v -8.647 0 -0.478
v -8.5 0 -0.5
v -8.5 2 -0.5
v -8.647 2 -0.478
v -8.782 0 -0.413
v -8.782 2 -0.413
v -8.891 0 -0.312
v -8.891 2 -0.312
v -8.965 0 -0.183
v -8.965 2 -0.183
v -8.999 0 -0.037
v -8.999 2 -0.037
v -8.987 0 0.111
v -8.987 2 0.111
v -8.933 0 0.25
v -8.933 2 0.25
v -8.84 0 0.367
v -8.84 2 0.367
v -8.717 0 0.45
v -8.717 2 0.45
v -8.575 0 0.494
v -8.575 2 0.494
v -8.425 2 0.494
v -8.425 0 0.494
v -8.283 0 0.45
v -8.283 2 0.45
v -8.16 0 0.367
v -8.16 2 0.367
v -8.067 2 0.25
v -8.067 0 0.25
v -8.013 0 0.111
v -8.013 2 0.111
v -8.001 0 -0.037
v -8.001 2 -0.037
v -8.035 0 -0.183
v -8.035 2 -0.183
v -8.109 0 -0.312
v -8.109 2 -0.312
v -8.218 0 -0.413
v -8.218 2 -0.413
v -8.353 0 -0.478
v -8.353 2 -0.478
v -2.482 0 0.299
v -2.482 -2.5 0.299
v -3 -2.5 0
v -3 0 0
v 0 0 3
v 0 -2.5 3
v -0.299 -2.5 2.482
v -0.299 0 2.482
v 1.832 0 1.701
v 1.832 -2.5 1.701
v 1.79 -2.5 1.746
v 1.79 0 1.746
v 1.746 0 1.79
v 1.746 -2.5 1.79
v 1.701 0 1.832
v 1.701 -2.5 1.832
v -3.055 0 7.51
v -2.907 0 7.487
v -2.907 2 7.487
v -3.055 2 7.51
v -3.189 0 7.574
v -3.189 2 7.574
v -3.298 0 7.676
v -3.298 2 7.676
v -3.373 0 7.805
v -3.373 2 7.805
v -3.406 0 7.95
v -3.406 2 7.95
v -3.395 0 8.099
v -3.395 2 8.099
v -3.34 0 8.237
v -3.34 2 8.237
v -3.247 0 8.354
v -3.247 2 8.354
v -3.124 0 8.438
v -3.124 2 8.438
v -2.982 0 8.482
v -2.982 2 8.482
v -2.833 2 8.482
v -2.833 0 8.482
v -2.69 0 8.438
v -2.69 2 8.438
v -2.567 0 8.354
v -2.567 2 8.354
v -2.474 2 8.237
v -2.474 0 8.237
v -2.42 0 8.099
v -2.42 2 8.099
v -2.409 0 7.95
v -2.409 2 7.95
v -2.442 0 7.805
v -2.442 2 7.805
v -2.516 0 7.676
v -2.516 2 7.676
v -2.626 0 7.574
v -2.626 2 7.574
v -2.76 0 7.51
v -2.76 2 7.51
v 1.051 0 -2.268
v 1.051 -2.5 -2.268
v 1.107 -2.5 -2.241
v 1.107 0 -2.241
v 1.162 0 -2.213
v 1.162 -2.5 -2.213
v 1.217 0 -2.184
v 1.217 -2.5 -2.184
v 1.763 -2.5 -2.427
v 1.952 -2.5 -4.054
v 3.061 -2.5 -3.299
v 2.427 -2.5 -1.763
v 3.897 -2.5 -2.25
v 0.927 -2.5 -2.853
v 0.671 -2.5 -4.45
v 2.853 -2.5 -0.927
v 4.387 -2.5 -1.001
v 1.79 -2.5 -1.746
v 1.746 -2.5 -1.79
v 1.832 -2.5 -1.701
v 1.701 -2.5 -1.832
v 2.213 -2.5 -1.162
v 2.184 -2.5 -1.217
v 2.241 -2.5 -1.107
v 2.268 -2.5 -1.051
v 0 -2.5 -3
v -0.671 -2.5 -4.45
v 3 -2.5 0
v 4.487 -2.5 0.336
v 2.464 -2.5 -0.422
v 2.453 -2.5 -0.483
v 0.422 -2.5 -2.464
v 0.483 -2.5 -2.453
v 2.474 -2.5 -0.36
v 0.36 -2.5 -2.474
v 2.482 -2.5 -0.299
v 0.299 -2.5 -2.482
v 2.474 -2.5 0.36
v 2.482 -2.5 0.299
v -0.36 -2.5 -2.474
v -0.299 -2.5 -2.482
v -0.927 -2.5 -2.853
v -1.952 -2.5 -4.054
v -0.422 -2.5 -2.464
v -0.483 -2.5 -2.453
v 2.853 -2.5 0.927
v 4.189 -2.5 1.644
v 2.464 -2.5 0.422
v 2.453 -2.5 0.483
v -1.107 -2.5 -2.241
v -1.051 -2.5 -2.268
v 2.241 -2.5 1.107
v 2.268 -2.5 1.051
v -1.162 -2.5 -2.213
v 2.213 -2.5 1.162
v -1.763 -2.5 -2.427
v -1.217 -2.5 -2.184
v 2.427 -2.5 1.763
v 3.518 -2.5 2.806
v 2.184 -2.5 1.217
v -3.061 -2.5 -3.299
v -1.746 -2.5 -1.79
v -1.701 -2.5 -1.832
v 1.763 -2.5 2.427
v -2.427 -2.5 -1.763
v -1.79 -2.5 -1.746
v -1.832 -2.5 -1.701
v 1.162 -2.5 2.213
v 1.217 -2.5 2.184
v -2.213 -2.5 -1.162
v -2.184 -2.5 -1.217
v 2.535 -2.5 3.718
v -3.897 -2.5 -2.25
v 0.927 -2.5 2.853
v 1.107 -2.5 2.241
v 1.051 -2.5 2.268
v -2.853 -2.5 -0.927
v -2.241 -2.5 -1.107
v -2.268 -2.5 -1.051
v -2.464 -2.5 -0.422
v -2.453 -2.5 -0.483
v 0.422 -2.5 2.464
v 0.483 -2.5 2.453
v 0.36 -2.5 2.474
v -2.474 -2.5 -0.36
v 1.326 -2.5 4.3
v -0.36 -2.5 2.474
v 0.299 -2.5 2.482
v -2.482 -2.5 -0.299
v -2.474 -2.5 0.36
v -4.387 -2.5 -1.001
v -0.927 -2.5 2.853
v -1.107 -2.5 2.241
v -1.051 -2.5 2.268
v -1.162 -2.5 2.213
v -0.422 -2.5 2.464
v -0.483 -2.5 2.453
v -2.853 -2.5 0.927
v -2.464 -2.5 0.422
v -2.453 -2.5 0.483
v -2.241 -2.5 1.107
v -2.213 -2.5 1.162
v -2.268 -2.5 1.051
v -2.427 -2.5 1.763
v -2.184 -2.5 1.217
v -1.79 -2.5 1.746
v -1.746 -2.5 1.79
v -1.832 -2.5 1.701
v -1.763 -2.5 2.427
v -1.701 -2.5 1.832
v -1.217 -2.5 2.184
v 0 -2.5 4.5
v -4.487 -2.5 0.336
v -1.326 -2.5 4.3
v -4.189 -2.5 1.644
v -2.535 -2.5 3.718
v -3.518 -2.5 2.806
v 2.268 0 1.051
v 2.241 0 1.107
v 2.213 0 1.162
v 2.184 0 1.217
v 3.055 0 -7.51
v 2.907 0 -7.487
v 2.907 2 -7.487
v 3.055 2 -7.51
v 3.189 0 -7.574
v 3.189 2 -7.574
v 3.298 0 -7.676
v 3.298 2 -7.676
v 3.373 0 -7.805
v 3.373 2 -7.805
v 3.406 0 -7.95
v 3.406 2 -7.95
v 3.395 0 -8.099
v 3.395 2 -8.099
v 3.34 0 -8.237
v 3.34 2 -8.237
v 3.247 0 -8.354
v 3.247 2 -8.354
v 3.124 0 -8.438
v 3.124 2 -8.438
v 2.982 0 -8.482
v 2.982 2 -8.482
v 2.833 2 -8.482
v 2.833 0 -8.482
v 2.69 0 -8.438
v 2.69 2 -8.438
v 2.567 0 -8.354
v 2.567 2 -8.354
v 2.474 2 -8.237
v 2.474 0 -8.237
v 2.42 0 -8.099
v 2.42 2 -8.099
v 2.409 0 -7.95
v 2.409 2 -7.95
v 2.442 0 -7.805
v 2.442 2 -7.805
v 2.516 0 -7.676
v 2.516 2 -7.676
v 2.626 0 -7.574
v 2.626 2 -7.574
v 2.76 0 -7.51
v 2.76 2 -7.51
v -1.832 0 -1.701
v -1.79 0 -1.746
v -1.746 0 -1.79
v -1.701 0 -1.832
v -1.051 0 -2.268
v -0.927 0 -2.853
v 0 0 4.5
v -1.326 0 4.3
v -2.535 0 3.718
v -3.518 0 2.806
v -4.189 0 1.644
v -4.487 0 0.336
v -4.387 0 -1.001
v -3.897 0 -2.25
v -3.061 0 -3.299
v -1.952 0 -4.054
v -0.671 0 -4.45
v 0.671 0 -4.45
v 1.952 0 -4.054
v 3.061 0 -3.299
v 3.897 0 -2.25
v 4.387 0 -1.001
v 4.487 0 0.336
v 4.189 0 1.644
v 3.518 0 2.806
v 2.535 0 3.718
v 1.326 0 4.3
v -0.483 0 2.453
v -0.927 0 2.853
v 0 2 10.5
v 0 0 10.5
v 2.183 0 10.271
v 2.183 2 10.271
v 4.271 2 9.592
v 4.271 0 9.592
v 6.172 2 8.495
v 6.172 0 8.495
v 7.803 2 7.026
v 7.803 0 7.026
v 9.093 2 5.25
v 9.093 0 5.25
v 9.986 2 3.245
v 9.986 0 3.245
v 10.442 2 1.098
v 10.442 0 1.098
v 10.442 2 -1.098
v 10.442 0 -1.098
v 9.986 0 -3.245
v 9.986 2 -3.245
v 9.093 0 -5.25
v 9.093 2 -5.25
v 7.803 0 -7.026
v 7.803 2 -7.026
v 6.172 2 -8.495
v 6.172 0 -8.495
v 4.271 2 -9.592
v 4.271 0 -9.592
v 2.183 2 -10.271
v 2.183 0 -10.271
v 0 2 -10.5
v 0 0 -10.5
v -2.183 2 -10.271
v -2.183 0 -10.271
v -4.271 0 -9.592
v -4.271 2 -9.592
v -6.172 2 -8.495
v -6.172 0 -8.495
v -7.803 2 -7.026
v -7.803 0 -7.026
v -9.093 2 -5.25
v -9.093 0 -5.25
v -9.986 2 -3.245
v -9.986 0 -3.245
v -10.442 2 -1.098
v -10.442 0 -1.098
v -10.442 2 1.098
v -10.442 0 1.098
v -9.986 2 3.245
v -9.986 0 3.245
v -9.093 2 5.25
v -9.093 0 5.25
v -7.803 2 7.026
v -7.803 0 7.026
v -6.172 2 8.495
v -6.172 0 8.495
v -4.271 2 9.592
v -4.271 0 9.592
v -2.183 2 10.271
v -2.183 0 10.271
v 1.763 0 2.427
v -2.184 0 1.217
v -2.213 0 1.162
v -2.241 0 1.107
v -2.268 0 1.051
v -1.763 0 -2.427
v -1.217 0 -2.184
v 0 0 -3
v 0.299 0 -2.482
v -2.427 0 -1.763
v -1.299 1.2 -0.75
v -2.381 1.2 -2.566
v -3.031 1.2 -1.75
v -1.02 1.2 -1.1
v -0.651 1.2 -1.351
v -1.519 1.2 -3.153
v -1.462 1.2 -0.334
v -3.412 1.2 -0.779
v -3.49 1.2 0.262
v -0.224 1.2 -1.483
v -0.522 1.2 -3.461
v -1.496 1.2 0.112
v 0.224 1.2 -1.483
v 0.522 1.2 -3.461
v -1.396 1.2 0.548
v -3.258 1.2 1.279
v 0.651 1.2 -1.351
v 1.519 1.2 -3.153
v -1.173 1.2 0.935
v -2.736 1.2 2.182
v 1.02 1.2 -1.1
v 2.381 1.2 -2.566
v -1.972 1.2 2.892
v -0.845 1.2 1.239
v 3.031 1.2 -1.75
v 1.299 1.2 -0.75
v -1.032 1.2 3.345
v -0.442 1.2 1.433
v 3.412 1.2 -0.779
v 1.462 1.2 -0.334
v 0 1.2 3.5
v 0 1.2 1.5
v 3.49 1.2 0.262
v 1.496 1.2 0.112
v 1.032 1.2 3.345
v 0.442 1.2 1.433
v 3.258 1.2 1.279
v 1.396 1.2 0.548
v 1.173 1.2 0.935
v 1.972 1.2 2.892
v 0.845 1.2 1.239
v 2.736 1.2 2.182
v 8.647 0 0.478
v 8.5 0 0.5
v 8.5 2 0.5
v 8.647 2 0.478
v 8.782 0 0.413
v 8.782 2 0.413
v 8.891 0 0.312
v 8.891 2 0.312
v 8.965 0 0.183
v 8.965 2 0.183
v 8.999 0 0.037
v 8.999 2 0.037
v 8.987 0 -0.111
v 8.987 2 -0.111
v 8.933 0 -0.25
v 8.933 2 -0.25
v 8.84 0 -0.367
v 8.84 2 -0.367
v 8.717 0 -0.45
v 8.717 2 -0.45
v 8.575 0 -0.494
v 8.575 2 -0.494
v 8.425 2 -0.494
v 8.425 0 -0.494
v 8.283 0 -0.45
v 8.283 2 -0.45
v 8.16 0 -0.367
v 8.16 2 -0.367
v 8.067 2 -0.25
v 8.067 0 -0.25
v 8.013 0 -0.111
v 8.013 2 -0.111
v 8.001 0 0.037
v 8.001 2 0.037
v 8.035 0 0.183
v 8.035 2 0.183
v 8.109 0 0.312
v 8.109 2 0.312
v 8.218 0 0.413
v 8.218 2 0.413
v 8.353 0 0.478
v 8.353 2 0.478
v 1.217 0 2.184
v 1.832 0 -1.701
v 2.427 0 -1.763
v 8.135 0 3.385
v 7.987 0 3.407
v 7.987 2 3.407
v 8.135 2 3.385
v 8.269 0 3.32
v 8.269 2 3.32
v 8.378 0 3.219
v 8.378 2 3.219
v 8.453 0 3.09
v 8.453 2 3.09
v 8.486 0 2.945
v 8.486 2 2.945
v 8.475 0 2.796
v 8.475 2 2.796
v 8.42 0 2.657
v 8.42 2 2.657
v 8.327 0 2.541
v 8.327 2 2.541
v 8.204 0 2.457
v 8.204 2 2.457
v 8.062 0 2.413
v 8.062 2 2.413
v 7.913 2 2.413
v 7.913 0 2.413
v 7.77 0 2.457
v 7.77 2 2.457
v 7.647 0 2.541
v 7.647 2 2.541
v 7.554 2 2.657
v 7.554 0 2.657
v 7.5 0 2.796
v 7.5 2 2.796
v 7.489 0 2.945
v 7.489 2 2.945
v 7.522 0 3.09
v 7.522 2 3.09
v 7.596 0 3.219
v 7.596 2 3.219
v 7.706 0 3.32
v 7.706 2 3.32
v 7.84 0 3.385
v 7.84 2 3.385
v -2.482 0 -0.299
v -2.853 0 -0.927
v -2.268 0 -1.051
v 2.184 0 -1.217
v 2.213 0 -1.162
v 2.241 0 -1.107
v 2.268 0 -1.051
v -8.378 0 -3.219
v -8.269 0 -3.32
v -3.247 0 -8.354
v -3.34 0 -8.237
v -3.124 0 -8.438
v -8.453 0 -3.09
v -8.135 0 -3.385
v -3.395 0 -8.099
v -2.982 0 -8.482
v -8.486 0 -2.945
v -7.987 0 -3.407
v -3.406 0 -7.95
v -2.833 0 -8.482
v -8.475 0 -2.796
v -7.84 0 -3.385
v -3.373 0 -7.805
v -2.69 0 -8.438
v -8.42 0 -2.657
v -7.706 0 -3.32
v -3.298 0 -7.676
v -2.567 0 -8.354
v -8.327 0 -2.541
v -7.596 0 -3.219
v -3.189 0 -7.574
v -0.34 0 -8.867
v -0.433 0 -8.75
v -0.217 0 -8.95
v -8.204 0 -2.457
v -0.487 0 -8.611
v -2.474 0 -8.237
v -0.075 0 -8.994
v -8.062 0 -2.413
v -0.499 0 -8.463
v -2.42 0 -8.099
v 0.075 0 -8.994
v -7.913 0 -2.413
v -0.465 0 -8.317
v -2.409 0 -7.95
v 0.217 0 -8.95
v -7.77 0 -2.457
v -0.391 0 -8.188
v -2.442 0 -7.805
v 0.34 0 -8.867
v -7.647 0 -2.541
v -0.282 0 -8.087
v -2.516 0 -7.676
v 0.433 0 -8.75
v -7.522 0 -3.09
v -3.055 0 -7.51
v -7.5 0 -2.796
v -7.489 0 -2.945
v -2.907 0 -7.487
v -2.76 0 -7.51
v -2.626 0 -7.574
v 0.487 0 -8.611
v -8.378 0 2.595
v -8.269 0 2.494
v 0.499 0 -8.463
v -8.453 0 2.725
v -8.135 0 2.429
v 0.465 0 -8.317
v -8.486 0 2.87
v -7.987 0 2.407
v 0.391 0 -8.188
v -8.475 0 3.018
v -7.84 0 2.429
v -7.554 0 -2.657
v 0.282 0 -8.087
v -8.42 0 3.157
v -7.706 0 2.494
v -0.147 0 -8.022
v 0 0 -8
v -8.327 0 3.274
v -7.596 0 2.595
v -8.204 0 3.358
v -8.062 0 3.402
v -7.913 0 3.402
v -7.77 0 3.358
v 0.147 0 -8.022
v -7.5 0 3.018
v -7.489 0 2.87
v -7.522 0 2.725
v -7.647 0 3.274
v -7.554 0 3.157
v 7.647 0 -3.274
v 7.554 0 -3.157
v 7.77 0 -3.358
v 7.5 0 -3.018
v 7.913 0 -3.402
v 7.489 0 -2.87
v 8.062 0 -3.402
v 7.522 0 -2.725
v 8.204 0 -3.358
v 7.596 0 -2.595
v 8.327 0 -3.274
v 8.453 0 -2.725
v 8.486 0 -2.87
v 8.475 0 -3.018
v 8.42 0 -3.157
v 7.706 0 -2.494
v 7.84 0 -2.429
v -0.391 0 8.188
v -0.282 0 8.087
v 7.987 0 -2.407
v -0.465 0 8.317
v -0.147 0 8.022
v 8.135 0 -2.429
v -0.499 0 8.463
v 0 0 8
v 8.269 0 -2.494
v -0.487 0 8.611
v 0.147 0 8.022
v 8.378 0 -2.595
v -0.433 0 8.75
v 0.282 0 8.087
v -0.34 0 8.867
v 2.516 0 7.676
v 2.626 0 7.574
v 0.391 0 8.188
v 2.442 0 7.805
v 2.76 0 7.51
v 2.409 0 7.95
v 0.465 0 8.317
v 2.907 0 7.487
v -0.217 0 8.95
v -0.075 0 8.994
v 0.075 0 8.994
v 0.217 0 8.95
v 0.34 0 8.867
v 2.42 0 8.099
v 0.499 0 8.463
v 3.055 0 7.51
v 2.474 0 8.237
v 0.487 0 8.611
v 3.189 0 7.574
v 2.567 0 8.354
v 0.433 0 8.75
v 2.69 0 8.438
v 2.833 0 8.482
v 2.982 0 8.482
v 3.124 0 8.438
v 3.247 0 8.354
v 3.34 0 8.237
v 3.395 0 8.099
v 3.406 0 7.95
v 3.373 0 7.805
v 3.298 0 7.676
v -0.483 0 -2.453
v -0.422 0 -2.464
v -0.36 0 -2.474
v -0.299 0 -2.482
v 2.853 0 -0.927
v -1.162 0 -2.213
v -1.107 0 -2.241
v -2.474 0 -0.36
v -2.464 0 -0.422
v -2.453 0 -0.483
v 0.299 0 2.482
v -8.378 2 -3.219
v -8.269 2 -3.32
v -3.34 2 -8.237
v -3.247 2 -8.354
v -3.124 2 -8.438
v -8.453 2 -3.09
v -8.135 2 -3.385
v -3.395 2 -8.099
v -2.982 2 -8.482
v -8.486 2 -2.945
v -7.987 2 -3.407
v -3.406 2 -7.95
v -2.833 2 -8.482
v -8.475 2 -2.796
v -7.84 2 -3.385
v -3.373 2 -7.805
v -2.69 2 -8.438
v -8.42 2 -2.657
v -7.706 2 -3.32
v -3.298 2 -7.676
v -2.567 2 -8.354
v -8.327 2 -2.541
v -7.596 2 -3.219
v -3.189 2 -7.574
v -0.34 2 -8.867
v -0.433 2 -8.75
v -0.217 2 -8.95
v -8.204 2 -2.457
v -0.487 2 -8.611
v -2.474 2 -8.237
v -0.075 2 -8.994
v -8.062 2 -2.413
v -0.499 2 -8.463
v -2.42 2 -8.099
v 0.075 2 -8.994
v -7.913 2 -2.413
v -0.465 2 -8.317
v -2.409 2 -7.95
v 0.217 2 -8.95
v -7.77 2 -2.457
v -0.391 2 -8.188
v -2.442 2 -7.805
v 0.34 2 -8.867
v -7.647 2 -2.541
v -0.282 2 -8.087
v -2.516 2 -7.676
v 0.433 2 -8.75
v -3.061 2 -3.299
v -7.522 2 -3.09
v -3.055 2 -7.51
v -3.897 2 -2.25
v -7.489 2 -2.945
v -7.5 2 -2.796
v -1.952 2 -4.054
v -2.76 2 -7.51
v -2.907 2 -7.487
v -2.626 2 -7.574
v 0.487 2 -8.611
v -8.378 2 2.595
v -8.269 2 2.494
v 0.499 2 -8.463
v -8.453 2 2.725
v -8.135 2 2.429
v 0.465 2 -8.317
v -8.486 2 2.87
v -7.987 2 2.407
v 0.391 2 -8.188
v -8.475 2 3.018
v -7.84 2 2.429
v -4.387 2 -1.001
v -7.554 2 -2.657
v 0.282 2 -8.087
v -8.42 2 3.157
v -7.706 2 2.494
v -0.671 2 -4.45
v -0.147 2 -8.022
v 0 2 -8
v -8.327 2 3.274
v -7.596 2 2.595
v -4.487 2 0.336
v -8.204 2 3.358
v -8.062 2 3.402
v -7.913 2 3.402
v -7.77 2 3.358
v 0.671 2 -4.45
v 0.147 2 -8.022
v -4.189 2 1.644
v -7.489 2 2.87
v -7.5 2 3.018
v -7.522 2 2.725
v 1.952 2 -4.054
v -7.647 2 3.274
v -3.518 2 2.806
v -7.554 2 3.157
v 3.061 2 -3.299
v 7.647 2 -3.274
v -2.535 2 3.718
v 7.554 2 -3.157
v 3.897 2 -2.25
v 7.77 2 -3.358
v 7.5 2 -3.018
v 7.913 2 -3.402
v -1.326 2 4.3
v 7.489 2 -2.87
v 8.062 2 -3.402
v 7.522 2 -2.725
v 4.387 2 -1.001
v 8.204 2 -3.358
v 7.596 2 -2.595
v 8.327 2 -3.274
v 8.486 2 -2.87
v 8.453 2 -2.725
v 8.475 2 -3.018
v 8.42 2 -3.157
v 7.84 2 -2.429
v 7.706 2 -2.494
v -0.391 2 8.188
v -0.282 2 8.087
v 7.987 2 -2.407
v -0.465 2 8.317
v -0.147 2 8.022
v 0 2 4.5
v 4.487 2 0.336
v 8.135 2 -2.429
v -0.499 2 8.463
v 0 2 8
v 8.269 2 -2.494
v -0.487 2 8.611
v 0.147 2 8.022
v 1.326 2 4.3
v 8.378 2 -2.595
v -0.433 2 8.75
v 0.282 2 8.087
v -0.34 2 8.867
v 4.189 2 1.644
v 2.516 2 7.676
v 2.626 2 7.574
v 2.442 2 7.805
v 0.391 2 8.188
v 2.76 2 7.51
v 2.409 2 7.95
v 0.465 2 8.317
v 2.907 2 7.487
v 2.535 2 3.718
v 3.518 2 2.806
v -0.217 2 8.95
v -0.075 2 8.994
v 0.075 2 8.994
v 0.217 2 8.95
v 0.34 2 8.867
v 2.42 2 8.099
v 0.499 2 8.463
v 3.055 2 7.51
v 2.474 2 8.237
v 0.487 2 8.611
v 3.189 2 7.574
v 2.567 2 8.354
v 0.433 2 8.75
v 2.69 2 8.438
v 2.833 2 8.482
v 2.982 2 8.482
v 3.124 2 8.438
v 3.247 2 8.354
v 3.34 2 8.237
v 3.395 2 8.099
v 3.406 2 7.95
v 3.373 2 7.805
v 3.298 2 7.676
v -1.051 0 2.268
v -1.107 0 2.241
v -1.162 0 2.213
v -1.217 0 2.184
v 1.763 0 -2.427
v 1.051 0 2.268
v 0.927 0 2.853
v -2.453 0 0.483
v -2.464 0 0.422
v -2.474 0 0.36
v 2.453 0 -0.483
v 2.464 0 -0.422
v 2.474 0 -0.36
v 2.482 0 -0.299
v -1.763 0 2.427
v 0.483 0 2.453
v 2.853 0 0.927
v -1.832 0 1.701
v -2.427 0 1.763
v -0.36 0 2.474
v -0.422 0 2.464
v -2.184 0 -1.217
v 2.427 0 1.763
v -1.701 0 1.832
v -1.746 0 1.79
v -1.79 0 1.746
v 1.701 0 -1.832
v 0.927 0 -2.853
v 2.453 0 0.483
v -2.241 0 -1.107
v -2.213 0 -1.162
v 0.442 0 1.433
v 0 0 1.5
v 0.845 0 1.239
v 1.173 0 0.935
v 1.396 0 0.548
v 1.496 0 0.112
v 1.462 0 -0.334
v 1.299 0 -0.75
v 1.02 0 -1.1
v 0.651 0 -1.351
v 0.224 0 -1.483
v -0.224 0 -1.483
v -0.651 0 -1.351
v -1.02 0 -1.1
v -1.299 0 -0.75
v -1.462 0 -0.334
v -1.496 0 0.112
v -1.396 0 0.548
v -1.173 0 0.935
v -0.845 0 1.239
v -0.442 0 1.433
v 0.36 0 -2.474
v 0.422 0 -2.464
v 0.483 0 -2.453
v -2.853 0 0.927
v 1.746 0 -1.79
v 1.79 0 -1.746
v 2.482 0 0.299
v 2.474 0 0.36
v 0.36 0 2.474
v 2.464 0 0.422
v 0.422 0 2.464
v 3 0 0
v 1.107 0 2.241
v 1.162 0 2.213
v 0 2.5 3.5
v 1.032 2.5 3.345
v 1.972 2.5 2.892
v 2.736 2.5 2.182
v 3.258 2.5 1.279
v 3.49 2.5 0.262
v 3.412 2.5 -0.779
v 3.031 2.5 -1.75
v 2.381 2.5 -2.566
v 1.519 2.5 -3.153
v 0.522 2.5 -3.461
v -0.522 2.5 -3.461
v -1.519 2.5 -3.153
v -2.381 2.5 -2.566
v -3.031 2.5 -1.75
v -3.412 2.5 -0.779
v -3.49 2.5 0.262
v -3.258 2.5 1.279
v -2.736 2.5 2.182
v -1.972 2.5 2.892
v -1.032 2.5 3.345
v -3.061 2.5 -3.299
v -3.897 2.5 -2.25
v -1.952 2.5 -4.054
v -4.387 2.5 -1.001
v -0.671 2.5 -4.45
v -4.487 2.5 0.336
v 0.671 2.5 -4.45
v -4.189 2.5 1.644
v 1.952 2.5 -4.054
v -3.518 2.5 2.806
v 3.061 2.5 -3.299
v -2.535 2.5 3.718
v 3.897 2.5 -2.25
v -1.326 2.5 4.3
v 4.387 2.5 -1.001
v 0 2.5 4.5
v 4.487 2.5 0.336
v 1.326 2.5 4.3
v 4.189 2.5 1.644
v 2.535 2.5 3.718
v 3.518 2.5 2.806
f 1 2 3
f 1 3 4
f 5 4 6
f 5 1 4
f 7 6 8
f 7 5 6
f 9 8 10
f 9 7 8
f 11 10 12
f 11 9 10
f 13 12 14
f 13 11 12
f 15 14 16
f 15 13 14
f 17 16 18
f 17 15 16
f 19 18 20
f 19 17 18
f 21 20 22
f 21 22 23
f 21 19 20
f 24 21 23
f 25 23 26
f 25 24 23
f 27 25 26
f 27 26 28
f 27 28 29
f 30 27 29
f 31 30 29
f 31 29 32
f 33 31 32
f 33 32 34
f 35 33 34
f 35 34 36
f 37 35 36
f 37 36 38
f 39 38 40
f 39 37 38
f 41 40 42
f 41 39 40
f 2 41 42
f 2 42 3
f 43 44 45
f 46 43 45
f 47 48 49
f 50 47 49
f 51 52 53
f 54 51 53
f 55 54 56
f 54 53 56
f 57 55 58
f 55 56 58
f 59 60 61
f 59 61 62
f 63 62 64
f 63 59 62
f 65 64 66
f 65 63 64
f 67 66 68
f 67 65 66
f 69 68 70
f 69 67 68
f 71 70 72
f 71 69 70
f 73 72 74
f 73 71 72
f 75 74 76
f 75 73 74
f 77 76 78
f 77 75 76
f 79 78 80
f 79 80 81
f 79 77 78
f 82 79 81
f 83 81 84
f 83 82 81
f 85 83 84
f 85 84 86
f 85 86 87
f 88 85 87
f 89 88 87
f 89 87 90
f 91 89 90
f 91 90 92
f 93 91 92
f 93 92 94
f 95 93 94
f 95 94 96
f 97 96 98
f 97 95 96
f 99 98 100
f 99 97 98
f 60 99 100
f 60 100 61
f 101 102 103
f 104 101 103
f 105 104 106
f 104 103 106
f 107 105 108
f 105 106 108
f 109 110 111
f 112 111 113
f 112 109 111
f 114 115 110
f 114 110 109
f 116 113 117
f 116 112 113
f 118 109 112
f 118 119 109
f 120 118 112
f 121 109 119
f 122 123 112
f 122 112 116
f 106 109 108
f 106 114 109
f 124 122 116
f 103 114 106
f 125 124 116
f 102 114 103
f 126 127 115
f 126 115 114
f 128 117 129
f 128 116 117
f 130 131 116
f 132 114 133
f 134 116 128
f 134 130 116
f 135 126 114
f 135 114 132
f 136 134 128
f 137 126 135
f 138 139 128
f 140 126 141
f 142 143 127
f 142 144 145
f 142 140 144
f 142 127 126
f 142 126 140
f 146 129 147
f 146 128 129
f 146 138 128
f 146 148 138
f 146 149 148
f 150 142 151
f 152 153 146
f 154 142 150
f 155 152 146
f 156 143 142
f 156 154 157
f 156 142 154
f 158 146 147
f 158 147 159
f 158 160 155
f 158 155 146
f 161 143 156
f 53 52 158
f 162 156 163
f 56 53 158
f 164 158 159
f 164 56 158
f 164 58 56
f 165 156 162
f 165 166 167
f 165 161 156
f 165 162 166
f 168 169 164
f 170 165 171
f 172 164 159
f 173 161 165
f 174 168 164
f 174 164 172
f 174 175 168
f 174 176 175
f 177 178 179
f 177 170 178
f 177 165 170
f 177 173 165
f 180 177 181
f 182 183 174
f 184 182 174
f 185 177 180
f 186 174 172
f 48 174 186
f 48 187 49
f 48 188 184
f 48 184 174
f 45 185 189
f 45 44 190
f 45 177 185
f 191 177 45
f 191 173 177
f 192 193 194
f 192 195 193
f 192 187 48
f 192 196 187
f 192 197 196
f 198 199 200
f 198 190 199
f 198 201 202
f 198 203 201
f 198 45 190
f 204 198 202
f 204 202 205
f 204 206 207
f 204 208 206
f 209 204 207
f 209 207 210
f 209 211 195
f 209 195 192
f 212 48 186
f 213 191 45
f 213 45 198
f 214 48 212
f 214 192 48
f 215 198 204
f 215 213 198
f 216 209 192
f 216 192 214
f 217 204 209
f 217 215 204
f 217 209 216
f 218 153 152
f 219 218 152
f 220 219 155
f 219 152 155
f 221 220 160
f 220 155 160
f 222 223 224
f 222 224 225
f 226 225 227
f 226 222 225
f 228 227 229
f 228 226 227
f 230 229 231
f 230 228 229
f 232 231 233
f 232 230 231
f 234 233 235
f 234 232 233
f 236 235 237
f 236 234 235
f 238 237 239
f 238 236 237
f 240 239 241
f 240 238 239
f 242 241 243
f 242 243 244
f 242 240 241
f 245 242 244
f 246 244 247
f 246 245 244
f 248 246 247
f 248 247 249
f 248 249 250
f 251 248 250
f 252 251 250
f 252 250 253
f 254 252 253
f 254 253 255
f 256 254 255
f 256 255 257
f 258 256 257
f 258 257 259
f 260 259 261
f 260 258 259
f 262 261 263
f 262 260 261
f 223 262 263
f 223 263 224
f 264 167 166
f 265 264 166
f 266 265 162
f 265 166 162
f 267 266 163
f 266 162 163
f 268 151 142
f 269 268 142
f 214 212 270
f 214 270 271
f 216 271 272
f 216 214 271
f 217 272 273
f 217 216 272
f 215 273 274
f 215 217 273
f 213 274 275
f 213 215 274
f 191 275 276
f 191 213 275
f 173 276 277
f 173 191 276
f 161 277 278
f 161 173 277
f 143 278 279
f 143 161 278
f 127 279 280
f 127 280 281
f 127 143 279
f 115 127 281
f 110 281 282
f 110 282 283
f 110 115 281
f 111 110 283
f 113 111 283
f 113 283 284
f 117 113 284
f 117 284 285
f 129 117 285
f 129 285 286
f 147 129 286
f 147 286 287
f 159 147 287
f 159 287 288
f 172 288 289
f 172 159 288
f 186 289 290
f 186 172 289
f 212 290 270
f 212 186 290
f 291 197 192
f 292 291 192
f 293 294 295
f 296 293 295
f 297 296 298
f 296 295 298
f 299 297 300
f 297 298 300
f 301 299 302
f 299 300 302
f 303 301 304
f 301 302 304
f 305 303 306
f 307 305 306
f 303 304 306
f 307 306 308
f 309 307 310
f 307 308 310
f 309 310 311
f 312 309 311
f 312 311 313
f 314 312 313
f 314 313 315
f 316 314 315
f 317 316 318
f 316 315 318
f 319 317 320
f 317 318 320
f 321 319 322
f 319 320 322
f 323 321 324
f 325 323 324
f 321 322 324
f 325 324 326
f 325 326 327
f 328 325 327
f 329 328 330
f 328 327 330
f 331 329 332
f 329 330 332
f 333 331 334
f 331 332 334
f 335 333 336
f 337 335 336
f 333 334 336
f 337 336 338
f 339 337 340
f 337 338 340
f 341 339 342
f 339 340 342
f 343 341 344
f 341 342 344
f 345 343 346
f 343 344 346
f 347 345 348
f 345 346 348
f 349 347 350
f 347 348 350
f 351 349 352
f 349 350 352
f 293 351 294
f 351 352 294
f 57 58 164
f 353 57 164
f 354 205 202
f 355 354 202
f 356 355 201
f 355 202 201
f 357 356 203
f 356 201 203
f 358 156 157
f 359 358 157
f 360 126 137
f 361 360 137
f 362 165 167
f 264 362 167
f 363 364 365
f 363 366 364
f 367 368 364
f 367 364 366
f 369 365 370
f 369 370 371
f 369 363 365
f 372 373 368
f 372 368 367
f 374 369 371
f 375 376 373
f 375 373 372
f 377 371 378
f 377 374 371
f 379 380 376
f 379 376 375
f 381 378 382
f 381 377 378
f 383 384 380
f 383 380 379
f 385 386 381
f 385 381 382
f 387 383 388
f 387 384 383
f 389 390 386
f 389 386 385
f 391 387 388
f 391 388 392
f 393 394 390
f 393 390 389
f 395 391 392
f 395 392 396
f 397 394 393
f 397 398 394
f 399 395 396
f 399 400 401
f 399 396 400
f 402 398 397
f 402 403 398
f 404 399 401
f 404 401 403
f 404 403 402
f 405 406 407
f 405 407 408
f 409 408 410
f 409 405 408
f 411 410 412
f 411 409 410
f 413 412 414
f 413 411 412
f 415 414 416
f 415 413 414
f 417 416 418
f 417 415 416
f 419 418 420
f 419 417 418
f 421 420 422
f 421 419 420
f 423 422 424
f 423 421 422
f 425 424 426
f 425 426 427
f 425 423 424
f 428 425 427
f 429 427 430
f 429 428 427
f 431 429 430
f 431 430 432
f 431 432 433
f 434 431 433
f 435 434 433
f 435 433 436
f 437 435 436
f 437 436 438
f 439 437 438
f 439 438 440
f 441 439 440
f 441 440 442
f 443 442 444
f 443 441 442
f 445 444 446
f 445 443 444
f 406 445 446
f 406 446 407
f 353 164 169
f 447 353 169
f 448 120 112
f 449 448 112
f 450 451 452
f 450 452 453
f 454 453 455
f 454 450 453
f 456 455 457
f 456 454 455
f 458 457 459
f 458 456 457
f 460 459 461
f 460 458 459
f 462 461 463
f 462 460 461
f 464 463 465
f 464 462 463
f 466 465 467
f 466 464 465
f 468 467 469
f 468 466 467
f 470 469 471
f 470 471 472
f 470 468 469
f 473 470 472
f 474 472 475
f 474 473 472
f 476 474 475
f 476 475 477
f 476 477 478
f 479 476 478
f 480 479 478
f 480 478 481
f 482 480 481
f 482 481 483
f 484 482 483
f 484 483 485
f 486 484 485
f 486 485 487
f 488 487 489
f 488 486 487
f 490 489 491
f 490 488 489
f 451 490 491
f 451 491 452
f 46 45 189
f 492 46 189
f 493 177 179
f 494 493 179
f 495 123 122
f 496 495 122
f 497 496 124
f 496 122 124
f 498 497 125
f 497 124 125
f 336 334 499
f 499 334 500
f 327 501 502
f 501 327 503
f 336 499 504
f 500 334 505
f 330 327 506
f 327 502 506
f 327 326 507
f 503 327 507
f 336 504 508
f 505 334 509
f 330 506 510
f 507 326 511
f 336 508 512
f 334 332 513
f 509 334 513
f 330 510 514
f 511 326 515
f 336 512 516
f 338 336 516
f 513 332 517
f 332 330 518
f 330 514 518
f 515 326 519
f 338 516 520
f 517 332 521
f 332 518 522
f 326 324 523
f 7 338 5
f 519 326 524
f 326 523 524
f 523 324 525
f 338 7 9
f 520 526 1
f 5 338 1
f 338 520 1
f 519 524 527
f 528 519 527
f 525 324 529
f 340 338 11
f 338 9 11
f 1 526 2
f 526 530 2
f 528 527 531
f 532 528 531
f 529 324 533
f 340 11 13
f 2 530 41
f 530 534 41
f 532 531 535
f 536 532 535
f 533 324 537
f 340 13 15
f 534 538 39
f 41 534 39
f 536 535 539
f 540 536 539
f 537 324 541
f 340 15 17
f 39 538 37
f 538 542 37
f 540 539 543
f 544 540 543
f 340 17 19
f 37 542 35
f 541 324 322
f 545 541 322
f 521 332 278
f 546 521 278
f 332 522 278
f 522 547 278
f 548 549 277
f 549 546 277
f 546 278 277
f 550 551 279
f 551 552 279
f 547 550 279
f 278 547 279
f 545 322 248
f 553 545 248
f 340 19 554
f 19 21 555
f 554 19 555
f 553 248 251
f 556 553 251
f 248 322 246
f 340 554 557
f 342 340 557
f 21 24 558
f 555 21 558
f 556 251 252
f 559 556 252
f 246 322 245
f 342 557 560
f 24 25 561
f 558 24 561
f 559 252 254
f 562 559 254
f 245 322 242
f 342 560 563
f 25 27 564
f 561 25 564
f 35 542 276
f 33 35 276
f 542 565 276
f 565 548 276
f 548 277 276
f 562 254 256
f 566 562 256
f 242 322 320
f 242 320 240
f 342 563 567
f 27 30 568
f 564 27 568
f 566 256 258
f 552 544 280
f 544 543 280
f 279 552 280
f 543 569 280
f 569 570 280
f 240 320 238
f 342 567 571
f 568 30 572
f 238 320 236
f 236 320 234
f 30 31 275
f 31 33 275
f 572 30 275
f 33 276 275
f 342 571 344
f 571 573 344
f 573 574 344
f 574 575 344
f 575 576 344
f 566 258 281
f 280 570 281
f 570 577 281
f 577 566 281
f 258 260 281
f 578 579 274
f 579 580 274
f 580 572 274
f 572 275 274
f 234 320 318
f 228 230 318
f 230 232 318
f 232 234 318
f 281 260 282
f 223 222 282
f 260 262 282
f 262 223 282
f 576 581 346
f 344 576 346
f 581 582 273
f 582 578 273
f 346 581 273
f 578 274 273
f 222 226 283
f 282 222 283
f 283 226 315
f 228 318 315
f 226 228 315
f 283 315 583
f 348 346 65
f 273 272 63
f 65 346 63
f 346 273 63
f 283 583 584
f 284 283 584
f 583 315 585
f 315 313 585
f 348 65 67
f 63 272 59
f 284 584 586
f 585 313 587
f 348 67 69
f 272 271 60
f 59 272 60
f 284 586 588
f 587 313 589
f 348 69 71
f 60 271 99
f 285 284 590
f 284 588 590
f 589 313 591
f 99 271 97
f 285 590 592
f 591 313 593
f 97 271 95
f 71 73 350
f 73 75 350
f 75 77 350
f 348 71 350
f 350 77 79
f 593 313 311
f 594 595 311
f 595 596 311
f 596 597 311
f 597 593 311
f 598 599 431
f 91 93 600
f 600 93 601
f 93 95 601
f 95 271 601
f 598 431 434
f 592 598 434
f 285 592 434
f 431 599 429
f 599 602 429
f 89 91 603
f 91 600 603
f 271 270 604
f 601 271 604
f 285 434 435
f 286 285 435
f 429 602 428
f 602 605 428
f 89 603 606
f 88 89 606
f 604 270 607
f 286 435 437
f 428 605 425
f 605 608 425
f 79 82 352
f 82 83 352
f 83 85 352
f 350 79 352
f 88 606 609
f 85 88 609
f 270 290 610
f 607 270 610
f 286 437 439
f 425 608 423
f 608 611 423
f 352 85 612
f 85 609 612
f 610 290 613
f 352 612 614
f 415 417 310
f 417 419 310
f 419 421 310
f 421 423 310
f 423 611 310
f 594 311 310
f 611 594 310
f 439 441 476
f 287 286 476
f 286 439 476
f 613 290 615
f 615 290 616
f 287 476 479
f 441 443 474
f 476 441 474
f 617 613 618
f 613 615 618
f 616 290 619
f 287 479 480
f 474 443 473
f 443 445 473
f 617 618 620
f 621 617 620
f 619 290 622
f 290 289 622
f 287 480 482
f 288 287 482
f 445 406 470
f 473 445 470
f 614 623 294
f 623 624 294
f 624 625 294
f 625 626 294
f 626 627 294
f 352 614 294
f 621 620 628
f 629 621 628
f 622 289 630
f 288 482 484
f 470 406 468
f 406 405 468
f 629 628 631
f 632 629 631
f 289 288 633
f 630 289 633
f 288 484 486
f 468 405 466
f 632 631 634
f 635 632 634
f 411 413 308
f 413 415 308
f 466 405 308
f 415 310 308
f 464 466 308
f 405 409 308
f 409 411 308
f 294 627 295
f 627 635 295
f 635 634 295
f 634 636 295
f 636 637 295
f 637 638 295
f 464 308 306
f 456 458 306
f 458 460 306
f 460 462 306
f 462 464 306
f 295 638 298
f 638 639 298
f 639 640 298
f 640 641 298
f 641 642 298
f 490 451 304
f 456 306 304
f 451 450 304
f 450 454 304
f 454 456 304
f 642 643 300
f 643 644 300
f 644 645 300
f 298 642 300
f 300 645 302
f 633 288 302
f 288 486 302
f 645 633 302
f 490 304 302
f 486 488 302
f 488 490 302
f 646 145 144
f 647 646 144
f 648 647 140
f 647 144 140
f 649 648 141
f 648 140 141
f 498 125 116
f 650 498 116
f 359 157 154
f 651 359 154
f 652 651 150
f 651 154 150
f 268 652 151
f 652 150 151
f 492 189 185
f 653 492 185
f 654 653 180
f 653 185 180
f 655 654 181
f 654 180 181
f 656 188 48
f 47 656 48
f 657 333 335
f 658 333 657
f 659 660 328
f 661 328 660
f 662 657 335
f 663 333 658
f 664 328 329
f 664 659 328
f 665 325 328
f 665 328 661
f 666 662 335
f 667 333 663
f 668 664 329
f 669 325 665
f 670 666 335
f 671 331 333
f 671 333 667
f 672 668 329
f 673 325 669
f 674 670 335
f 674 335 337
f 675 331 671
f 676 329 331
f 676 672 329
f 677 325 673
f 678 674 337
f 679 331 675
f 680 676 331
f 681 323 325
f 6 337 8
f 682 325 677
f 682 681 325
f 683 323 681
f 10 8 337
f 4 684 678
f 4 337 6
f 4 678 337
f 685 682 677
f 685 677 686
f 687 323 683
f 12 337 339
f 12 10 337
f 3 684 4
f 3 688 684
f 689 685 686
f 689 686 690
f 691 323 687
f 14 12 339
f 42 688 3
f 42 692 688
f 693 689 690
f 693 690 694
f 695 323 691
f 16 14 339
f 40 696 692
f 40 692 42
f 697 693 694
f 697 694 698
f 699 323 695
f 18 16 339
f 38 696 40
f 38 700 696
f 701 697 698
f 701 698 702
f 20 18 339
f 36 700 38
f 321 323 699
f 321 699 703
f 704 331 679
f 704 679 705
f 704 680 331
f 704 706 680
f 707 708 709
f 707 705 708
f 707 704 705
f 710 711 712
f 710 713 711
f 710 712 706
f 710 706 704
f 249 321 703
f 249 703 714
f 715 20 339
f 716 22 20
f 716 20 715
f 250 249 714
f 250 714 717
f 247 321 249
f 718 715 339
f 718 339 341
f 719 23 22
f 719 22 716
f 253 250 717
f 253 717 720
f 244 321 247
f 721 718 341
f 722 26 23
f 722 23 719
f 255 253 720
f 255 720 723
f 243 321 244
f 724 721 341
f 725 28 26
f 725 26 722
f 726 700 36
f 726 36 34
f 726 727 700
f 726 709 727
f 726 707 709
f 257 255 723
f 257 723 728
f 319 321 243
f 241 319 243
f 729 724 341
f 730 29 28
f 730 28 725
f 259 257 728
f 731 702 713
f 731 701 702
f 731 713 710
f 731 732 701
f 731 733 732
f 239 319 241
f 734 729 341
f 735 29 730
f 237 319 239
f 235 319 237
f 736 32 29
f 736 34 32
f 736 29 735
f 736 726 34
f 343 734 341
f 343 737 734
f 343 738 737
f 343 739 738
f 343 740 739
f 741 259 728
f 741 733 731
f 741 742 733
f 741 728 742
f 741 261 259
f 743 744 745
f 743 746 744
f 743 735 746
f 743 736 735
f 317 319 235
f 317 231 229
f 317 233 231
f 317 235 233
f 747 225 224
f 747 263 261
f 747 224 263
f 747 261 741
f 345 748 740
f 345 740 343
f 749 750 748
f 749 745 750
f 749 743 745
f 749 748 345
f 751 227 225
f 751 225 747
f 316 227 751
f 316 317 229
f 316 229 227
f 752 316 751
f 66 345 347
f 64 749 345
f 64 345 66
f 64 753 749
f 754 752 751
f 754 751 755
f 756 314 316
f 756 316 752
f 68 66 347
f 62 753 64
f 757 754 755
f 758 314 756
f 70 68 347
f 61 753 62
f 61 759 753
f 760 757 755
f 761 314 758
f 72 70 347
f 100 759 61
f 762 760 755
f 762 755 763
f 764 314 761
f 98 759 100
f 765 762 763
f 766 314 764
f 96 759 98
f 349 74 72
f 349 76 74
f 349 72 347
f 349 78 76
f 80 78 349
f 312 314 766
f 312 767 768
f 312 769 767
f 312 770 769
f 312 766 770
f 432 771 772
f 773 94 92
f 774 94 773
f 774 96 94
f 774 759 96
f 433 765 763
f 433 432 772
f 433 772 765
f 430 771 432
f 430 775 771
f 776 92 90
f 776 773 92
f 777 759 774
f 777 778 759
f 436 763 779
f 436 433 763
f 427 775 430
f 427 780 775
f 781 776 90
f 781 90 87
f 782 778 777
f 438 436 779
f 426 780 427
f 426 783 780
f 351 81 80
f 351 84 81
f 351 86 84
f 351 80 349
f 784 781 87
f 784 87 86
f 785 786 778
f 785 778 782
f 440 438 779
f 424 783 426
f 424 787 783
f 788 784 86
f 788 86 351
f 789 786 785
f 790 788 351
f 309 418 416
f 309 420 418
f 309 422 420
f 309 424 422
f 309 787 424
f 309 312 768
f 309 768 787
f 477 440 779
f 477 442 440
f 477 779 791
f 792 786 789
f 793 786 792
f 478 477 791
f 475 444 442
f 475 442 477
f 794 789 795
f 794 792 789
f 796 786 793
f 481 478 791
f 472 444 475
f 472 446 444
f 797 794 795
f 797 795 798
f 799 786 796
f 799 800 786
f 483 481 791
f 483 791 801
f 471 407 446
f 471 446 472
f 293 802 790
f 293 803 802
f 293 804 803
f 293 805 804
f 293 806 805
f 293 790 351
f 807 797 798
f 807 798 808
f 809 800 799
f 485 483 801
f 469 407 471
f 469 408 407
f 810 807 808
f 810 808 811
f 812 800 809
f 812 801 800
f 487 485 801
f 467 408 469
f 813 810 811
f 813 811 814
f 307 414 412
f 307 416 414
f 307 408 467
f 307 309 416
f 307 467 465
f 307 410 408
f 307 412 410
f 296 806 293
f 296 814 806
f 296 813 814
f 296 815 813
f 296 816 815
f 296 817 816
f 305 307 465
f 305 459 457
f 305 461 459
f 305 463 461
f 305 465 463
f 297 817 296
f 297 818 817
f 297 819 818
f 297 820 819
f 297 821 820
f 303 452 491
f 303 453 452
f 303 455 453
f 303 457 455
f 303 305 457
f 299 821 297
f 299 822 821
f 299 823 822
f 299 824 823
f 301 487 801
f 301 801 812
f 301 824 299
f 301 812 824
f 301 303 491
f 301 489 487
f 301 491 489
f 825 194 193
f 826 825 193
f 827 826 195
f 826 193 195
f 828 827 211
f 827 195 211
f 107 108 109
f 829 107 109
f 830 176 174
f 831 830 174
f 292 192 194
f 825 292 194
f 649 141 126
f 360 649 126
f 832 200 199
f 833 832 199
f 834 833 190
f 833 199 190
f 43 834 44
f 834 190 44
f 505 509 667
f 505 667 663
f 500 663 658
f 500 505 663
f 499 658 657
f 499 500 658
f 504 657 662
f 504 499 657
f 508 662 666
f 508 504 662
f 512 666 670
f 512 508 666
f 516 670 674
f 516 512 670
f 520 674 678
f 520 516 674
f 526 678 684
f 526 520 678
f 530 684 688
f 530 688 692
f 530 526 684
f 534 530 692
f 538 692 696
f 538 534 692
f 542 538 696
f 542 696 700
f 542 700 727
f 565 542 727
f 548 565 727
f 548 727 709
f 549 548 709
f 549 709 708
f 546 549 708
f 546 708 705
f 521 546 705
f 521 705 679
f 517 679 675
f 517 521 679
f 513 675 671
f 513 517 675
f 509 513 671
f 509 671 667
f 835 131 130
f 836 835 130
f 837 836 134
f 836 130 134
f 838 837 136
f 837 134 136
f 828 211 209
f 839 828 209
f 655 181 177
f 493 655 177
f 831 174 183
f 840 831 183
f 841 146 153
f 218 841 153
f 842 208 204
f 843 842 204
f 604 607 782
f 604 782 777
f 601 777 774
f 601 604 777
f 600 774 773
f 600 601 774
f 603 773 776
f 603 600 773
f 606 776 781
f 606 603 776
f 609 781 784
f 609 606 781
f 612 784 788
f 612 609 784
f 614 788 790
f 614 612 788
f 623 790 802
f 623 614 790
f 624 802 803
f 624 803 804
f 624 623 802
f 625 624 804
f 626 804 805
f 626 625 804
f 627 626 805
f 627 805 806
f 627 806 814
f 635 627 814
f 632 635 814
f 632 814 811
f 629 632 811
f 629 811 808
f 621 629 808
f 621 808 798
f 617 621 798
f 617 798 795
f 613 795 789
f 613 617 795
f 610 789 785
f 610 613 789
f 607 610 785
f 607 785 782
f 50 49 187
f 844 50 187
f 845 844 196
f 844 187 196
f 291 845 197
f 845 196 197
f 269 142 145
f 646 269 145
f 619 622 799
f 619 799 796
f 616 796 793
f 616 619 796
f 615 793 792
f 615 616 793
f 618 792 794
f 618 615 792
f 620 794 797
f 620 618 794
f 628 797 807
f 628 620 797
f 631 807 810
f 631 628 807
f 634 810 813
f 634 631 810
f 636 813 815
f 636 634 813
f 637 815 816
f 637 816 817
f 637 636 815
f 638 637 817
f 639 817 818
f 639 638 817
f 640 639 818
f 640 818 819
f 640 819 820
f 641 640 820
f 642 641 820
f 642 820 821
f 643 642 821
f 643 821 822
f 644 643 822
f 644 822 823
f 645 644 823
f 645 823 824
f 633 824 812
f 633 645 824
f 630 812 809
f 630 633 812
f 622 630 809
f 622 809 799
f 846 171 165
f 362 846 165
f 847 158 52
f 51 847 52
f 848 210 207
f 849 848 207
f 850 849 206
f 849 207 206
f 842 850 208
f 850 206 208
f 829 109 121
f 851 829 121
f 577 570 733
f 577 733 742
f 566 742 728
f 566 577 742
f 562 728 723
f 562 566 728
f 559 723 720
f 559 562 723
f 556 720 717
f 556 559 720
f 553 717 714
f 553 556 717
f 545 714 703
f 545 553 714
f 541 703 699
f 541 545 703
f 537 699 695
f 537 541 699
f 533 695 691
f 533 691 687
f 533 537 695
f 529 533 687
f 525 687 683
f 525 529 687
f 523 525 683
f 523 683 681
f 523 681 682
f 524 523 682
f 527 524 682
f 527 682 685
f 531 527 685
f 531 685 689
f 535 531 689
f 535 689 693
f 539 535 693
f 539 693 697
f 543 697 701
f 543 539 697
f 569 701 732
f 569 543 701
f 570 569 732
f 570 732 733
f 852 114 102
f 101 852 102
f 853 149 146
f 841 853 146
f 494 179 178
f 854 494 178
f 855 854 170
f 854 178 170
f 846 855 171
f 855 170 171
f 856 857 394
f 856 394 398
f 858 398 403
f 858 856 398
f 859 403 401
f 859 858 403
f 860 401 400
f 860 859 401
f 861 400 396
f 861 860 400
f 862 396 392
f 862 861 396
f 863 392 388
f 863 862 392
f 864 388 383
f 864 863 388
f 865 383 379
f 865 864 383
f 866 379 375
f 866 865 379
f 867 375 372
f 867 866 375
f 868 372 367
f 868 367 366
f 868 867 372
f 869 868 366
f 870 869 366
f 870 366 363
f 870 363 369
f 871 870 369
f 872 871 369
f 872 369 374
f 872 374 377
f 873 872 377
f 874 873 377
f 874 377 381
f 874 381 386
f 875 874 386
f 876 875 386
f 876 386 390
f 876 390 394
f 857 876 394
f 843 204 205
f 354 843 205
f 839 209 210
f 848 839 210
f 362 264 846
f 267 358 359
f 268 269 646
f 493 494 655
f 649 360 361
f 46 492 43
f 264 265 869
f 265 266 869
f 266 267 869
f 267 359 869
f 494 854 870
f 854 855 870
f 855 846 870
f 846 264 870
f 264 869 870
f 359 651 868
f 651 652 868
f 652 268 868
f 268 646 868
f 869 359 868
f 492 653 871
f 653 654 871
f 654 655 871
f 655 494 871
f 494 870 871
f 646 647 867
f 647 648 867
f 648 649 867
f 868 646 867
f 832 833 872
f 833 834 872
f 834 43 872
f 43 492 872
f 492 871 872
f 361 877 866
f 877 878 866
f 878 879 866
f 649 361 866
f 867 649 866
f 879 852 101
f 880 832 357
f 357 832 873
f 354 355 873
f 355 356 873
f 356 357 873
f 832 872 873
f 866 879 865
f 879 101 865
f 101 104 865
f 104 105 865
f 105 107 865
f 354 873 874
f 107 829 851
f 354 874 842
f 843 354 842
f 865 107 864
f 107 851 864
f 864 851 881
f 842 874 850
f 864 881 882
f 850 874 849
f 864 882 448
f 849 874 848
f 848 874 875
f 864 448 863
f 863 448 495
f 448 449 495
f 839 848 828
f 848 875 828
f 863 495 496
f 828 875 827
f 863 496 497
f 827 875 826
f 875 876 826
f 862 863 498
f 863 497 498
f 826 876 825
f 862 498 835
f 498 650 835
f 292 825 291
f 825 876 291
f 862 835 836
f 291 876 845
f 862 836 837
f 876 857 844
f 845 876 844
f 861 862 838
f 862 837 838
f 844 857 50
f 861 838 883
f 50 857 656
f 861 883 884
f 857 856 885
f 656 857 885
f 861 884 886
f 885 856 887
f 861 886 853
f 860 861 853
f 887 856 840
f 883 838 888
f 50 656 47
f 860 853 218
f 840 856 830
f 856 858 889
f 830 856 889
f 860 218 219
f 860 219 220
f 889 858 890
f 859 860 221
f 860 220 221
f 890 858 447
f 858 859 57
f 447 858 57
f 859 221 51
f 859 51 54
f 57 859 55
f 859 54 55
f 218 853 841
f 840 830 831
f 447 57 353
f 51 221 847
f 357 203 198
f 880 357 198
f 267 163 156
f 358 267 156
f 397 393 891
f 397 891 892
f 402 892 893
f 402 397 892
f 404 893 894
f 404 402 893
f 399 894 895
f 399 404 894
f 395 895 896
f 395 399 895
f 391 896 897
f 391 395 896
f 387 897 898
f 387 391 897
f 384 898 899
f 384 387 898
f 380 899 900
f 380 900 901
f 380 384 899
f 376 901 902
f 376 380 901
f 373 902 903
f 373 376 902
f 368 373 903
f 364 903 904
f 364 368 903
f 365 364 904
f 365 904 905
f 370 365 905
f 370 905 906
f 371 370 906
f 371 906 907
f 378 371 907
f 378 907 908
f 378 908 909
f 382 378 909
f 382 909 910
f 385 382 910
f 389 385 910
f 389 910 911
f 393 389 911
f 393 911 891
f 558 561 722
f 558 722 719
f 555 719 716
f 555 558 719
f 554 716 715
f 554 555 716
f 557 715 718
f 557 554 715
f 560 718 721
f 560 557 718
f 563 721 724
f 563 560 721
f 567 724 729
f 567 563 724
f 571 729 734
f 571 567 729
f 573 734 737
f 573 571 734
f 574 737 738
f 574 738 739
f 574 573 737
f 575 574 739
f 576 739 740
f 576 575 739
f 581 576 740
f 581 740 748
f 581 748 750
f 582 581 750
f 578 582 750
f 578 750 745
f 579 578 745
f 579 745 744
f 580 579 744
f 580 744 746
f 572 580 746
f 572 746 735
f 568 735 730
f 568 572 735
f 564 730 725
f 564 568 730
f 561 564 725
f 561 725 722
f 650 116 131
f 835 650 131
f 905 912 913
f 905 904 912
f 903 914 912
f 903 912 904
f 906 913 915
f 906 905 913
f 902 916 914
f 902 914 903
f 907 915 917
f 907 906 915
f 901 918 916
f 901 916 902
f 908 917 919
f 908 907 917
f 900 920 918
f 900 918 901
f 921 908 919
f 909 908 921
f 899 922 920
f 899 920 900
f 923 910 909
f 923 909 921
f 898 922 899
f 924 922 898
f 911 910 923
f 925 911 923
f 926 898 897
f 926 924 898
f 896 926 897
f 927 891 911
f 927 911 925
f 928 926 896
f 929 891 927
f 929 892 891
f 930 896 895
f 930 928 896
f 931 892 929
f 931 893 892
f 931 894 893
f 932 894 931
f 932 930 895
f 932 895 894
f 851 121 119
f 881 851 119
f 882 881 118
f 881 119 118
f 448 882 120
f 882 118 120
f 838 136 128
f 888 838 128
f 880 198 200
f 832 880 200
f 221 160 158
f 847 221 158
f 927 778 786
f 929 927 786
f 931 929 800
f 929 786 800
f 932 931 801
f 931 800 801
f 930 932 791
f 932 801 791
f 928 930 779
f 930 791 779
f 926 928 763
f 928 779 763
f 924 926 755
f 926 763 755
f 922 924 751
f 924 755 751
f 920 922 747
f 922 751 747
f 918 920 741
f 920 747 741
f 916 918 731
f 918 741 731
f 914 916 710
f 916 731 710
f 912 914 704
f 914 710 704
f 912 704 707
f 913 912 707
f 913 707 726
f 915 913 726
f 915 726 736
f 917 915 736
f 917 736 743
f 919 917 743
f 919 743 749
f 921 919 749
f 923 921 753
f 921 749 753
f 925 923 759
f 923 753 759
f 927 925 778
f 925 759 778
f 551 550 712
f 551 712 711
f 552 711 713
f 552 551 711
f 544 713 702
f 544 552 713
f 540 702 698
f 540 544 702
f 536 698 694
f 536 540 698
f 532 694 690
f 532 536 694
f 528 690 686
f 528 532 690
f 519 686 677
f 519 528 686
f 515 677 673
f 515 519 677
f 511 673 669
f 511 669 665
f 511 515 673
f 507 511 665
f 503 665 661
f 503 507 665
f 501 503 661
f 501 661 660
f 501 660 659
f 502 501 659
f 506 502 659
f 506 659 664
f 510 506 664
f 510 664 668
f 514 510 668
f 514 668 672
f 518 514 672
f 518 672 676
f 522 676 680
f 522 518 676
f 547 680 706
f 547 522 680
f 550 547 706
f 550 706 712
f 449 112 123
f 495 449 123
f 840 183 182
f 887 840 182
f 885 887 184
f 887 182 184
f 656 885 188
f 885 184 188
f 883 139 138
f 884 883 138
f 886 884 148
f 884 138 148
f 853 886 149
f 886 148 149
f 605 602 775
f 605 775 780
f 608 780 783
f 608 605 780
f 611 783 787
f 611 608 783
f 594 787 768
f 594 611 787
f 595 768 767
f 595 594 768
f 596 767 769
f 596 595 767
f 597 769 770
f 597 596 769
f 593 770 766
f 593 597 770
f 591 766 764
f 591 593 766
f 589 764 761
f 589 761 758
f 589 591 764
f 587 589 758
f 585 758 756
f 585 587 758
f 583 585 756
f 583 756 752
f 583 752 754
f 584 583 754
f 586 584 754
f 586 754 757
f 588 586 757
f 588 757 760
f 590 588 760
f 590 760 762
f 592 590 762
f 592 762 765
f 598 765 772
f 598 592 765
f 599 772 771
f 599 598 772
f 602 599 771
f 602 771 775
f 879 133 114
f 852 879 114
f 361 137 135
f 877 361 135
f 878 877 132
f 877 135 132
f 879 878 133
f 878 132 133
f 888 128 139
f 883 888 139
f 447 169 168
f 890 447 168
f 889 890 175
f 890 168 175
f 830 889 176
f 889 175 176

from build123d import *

# Parameters (mm, degrees)
SKETCH1_R           = 10.5
SKETCH1_R_2         = 1.5
SKETCH1_R_3         = 0.5
BOSS_EXTRUDE1_DEPTH = 2
SKETCH2_R           = 4.5
SKETCH2_R_2         = 3.5
BOSS_EXTRUDE2_DEPTH = 0.5
CUT_EXTRUDE1_START  = -0.8
SKETCH3_R           = 3.5
SKETCH3_R_2         = 1.5
CUT_EXTRUDE1_DEPTH  = 0.8
BOSS_EXTRUDE3_START = 2.5
SKETCH4_R           = 4.5
SKETCH4_R_2         = 2.5
BOSS_EXTRUDE3_DEPTH = 2.5
CUT_EXTRUDE3_DEPTH  = 2.5


with BuildPart() as part:
    # Sketch1 → Boss-Extrude1 (new body)
    with BuildSketch(Plane(origin=(0, 0, 0), x_dir=(1, 0, 0), z_dir=(0, 1, 0))):
        with Locations(Location((0, 0, 0), (0, 0, 270))):
            Circle(SKETCH1_R)
        with Locations(Location((0, 0, 0), (0, 0, 270))):
            Circle(SKETCH1_R_2, mode=Mode.SUBTRACT)
        with Locations(Location((2.907171218, 7.987387277, 0), (0, 0, 270))):
            Circle(SKETCH1_R_3, mode=Mode.SUBTRACT)
        with Locations(Location((-2.907171218, 7.987387277, 0), (0, 0, 270))):
            Circle(SKETCH1_R_3, mode=Mode.SUBTRACT)
        with Locations(Location((2.907171218, -7.987387277, 0), (0, 0, 90))):
            Circle(SKETCH1_R_3, mode=Mode.SUBTRACT)
        with Locations(Location((-2.907171218, -7.987387277, 0), (0, 0, 90))):
            Circle(SKETCH1_R_3, mode=Mode.SUBTRACT)
        with Locations(Location((0, -8.5, 0), (0, 0, 90))):
            Circle(SKETCH1_R_3, mode=Mode.SUBTRACT)
        with Locations(Location((8.5, 0, 0), (0, 0, 270))):
            Circle(SKETCH1_R_3, mode=Mode.SUBTRACT)
        with Locations(Location((7.987387277, 2.907171218, 0), (0, 0, 270))):
            Circle(SKETCH1_R_3, mode=Mode.SUBTRACT)
        with Locations(Location((7.987387277, -2.907171218, 0), (0, 0, 270))):
            Circle(SKETCH1_R_3, mode=Mode.SUBTRACT)
        with Locations(Location((-7.987387277, -2.907171218, 0), (0, 0, 90))):
            Circle(SKETCH1_R_3, mode=Mode.SUBTRACT)
        with Locations(Location((-8.5, 0, 0), (0, 0, 90))):
            Circle(SKETCH1_R_3, mode=Mode.SUBTRACT)
        with Locations(Location((-7.987387277, 2.907171218, 0), (0, 0, 90))):
            Circle(SKETCH1_R_3, mode=Mode.SUBTRACT)
        with Locations(Location((0, 8.5, 0), (0, 0, 270))):
            Circle(SKETCH1_R_3, mode=Mode.SUBTRACT)
    extrude(amount=BOSS_EXTRUDE1_DEPTH)

    # Sketch2 → Boss-Extrude2 (add)
    with BuildSketch(Plane(origin=(0, 2, 0), x_dir=(1, 0, 0), z_dir=(0, 1, 0))):
        with Locations(Location((0, 0, 0), (0, 0, 270))):
            Circle(SKETCH2_R)
        with Locations(Location((0, 0, 0), (0, 0, 270))):
            Circle(SKETCH2_R_2, mode=Mode.SUBTRACT)
    extrude(amount=BOSS_EXTRUDE2_DEPTH)

    # Sketch3 → Cut-Extrude1 (cut)
    with BuildSketch(Plane(origin=(0, 2, 0), x_dir=(1, 0, 0), z_dir=(0, 1, 0)).offset(CUT_EXTRUDE1_START)):
        with Locations(Location((0, 0, 0), (0, 0, 270))):
            Circle(SKETCH3_R)
        with Locations(Location((0, 0, 0), (0, 0, 270))):
            Circle(SKETCH3_R_2, mode=Mode.SUBTRACT)
    extrude(amount=CUT_EXTRUDE1_DEPTH, mode=Mode.SUBTRACT)

    # Sketch4 → Boss-Extrude3 (add)
    with BuildSketch(Plane.XZ.offset(BOSS_EXTRUDE3_START)):
        with Locations(Location((0, 0, 0), (0, 0, 90))):
            Circle(SKETCH4_R)
        with Locations(Location((0, 0, 0), (0, 0, 270))):
            Circle(SKETCH4_R_2, mode=Mode.SUBTRACT)
    extrude(amount=-BOSS_EXTRUDE3_DEPTH)

    # Sketch5 → Cut-Extrude3 (cut)
    with BuildSketch(Plane.XZ.offset(2.5)):
        with BuildLine():
            Line((0.299038106, 2.482050808), (0, 3))
            Line((0, 3), (-0.299038106, 2.482050808))
            ThreePointArc((-0.299038106, 2.482050808), (-0.391086163, 2.469220851), (-0.482593741, 2.452978451))
            Line((-0.482593741, 2.452978451), (-0.927050983, 2.853169549))
            Line((-0.927050983, 2.853169549), (-1.051398019, 2.268162738))
            ThreePointArc((-1.051398019, 2.268162738), (-1.134976249, 2.22751631), (-1.216985951, 2.183791473))
            Line((-1.216985951, 2.183791473), (-1.763355757, 2.427050983))
            Line((-1.763355757, 2.427050983), (-1.70083977, 1.832251096))
            ThreePointArc((-1.70083977, 1.832251096), (-1.767766953, 1.767766953), (-1.832251096, 1.70083977))
            Line((-1.832251096, 1.70083977), (-2.427050983, 1.763355757))
            Line((-2.427050983, 1.763355757), (-2.183791473, 1.216985951))
            ThreePointArc((-2.183791473, 1.216985951), (-2.22751631, 1.134976249), (-2.268162738, 1.051398019))
            Line((-2.268162738, 1.051398019), (-2.853169549, 0.927050983))
            Line((-2.853169549, 0.927050983), (-2.452978451, 0.482593741))
            ThreePointArc((-2.452978451, 0.482593741), (-2.469220851, 0.391086163), (-2.482050808, 0.299038106))
            Line((-2.482050808, 0.299038106), (-3, 0))
            Line((-3, 0), (-2.482050808, -0.299038106))
            ThreePointArc((-2.482050808, -0.299038106), (-2.469220851, -0.391086163), (-2.452978451, -0.482593741))
            Line((-2.452978451, -0.482593741), (-2.853169549, -0.927050983))
            Line((-2.853169549, -0.927050983), (-2.268162738, -1.051398019))
            ThreePointArc((-2.268162738, -1.051398019), (-2.22751631, -1.134976249), (-2.183791473, -1.216985951))
            Line((-2.183791473, -1.216985951), (-2.427050983, -1.763355757))
            Line((-2.427050983, -1.763355757), (-1.832251096, -1.70083977))
            ThreePointArc((-1.832251096, -1.70083977), (-1.767766953, -1.767766953), (-1.70083977, -1.832251096))
            Line((-1.70083977, -1.832251096), (-1.763355757, -2.427050983))
            Line((-1.763355757, -2.427050983), (-1.216985951, -2.183791473))
            ThreePointArc((-1.216985951, -2.183791473), (-1.134976249, -2.22751631), (-1.051398019, -2.268162738))
            Line((-1.051398019, -2.268162738), (-0.927050983, -2.853169549))
            Line((-0.927050983, -2.853169549), (-0.482593741, -2.452978451))
            ThreePointArc((-0.482593741, -2.452978451), (-0.391086163, -2.469220851), (-0.299038106, -2.482050808))
            Line((-0.299038106, -2.482050808), (0, -3))
            Line((0, -3), (0.299038106, -2.482050808))
            ThreePointArc((0.299038106, -2.482050808), (0.391086163, -2.469220851), (0.482593741, -2.452978451))
            Line((0.482593741, -2.452978451), (0.927050983, -2.853169549))
            Line((0.927050983, -2.853169549), (1.051398019, -2.268162738))
            ThreePointArc((1.051398019, -2.268162738), (1.134976249, -2.22751631), (1.216985951, -2.183791473))
            Line((1.216985951, -2.183791473), (1.763355757, -2.427050983))
            Line((1.763355757, -2.427050983), (1.70083977, -1.832251096))
            ThreePointArc((1.70083977, -1.832251096), (1.767766953, -1.767766953), (1.832251096, -1.70083977))
            Line((1.832251096, -1.70083977), (2.427050983, -1.763355757))
            Line((2.427050983, -1.763355757), (2.183791473, -1.216985951))
            ThreePointArc((2.183791473, -1.216985951), (2.22751631, -1.134976249), (2.268162738, -1.051398019))
            Line((2.268162738, -1.051398019), (2.853169549, -0.927050983))
            Line((2.853169549, -0.927050983), (2.452978451, -0.482593741))
            ThreePointArc((2.452978451, -0.482593741), (2.469220851, -0.391086163), (2.482050808, -0.299038106))
            Line((2.482050808, -0.299038106), (3, 0))
            Line((3, 0), (2.482050808, 0.299038106))
            ThreePointArc((2.482050808, 0.299038106), (2.469220851, 0.391086163), (2.452978451, 0.482593741))
            Line((2.452978451, 0.482593741), (2.853169549, 0.927050983))
            Line((2.853169549, 0.927050983), (2.268162738, 1.051398019))
            ThreePointArc((2.268162738, 1.051398019), (2.22751631, 1.134976249), (2.183791473, 1.216985951))
            Line((2.183791473, 1.216985951), (2.427050983, 1.763355757))
            Line((2.427050983, 1.763355757), (1.832251096, 1.70083977))
            ThreePointArc((1.832251096, 1.70083977), (1.767766953, 1.767766953), (1.70083977, 1.832251096))
            Line((1.70083977, 1.832251096), (1.763355757, 2.427050983))
            Line((1.763355757, 2.427050983), (1.216985951, 2.183791473))
            ThreePointArc((1.216985951, 2.183791473), (1.134976249, 2.22751631), (1.051398019, 2.268162738))
            Line((1.051398019, 2.268162738), (0.927050983, 2.853169549))
            Line((0.927050983, 2.853169549), (0.482593741, 2.452978451))
            ThreePointArc((0.482593741, 2.452978451), (0.391086163, 2.469220851), (0.299038106, 2.482050808))
        make_face()
    extrude(amount=-CUT_EXTRUDE3_DEPTH, mode=Mode.SUBTRACT)


solid = part.part
